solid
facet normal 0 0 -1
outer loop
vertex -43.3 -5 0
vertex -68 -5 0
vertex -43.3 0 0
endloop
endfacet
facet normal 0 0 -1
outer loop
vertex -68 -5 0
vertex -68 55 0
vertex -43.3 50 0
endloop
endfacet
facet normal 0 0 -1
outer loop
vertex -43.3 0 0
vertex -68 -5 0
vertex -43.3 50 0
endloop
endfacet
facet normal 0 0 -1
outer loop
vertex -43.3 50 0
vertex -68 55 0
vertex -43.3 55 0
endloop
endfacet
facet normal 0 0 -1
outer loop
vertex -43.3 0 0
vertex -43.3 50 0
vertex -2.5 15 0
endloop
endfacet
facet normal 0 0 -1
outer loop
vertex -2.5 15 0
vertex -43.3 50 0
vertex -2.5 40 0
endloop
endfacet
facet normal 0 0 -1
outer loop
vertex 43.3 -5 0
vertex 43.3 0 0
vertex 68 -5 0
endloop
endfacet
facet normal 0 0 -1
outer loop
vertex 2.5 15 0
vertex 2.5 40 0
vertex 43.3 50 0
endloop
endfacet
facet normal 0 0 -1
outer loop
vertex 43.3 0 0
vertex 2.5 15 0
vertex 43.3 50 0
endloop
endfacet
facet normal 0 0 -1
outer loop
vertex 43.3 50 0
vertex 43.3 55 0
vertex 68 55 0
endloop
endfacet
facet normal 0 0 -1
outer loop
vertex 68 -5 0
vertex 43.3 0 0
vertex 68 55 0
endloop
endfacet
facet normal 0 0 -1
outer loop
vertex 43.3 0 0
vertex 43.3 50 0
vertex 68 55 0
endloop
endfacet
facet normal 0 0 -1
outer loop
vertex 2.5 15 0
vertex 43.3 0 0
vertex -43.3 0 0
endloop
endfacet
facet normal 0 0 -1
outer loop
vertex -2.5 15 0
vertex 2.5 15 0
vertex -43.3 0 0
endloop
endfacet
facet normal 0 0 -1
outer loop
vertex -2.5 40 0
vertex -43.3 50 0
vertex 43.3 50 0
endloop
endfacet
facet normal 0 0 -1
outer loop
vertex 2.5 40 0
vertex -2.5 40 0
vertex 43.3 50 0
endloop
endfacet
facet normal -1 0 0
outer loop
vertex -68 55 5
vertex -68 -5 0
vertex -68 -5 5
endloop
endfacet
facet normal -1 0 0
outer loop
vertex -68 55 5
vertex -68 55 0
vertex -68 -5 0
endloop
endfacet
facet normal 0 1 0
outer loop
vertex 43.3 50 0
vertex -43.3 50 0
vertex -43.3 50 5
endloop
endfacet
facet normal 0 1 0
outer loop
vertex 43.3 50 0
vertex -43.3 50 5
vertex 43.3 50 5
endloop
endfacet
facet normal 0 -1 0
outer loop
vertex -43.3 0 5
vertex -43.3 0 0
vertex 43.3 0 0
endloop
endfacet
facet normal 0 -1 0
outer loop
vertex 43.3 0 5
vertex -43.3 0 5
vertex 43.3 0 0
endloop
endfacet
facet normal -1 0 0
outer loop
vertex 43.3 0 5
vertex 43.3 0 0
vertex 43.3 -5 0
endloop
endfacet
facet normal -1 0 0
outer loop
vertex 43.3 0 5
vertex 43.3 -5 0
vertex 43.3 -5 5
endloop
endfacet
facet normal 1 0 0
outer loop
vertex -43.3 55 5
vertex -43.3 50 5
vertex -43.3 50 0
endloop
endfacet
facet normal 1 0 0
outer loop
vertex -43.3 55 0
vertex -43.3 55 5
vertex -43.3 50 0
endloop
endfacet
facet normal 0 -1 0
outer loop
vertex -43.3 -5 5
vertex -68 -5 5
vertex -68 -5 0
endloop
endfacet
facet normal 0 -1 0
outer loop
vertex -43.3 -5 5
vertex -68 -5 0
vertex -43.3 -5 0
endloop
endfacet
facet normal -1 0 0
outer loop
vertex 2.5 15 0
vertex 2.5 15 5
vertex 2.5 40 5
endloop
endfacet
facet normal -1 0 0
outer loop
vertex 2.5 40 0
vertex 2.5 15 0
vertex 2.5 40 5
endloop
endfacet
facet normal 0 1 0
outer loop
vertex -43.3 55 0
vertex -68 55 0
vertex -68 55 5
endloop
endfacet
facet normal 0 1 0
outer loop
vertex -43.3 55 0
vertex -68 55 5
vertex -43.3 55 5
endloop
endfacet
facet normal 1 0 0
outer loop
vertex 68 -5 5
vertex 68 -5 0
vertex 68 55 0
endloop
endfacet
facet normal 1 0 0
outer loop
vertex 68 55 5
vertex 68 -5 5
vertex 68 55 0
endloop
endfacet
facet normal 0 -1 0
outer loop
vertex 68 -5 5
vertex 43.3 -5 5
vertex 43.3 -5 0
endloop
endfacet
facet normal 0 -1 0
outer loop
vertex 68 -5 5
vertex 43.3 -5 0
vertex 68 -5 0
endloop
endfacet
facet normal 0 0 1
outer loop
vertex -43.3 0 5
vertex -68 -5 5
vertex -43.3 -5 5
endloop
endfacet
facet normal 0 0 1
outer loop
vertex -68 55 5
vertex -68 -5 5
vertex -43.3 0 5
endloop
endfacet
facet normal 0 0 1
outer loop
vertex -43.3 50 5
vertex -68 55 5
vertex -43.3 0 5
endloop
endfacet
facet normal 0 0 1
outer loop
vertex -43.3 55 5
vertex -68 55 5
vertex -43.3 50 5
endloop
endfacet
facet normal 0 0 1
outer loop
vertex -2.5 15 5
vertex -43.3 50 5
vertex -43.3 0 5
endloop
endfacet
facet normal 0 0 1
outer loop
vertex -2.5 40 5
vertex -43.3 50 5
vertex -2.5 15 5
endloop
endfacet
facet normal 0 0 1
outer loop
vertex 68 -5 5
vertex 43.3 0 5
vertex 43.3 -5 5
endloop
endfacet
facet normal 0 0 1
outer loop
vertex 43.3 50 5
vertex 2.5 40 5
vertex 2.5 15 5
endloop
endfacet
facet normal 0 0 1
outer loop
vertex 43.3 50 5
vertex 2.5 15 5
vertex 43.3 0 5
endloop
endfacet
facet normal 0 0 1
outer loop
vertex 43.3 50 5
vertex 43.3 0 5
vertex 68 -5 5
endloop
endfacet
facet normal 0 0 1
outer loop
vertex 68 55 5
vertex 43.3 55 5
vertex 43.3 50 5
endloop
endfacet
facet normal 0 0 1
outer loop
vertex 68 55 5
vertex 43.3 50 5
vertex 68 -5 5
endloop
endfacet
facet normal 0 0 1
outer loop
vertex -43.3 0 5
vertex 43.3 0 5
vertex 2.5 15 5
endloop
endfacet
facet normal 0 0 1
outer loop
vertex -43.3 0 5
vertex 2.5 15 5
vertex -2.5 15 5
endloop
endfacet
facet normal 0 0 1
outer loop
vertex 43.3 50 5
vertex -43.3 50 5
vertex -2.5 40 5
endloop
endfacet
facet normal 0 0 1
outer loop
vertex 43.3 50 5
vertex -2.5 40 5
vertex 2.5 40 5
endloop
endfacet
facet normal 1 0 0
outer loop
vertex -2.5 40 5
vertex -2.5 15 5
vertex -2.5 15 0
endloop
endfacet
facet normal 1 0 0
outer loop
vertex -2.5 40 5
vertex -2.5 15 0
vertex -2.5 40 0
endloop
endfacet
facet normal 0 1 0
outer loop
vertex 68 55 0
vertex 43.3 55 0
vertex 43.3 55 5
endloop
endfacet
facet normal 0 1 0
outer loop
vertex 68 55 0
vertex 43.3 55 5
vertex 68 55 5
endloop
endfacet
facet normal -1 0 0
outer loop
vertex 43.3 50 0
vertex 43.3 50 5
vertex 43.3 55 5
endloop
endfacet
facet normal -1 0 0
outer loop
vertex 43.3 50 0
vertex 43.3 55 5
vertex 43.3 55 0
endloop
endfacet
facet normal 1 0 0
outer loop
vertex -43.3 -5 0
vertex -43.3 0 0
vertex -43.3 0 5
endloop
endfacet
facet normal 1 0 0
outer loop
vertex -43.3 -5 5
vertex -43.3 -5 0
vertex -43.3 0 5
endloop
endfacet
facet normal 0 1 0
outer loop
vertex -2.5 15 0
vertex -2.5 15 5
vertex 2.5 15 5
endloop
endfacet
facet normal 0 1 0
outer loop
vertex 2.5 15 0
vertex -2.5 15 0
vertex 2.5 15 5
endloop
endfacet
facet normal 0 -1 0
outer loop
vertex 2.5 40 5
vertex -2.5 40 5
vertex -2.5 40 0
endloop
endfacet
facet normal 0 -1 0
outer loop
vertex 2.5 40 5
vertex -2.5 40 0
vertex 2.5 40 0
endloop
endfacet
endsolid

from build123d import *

# Parameters (mm, degrees)
SKETCH1_W           = 136
SKETCH1_H           = 50
BOSS_EXTRUDE1_DEPTH = 5
SKETCH2_W           = 24.7
SKETCH2_H           = 5
BOSS_EXTRUDE2_DEPTH = 5
SKETCH3_W           = 24.7
SKETCH3_H           = 5
BOSS_EXTRUDE3_DEPTH = 5
SKETCH4_W           = 5
SKETCH4_H           = 25
CUT_EXTRUDE1_DEPTH  = 5


with BuildPart() as part:
    # Sketch1 → Boss-Extrude1 (new body)
    with BuildSketch(Plane.XY):
        with Locations((0, 25)):
            Rectangle(SKETCH1_W, SKETCH1_H)
    extrude(amount=BOSS_EXTRUDE1_DEPTH)

    # Sketch2 → Boss-Extrude2 (add)
    with BuildSketch(Plane(origin=(0, 50, 0), x_dir=(1, 0, 0), z_dir=(0, 1, 0))):
        with Locations((-55.65, -2.5)):
            Rectangle(SKETCH2_W, SKETCH2_H)
        with Locations((55.65, -2.5)):
            Rectangle(SKETCH2_W, SKETCH2_H)
    extrude(amount=BOSS_EXTRUDE2_DEPTH)

    # Sketch3 → Boss-Extrude3 (add)
    with BuildSketch(Plane.XZ):
        with Locations((-55.65, 2.5)):
            Rectangle(SKETCH3_W, SKETCH3_H)
        with Locations((55.65, 2.5)):
            Rectangle(SKETCH3_W, SKETCH3_H)
    extrude(amount=BOSS_EXTRUDE3_DEPTH)

    # Sketch4 → Cut-Extrude1 (cut)
    with BuildSketch(Plane.XY.offset(5)):
        with Locations((0, 27.5)):
            Rectangle(SKETCH4_W, SKETCH4_H)
    extrude(amount=-CUT_EXTRUDE1_DEPTH, mode=Mode.SUBTRACT)


solid = part.part
